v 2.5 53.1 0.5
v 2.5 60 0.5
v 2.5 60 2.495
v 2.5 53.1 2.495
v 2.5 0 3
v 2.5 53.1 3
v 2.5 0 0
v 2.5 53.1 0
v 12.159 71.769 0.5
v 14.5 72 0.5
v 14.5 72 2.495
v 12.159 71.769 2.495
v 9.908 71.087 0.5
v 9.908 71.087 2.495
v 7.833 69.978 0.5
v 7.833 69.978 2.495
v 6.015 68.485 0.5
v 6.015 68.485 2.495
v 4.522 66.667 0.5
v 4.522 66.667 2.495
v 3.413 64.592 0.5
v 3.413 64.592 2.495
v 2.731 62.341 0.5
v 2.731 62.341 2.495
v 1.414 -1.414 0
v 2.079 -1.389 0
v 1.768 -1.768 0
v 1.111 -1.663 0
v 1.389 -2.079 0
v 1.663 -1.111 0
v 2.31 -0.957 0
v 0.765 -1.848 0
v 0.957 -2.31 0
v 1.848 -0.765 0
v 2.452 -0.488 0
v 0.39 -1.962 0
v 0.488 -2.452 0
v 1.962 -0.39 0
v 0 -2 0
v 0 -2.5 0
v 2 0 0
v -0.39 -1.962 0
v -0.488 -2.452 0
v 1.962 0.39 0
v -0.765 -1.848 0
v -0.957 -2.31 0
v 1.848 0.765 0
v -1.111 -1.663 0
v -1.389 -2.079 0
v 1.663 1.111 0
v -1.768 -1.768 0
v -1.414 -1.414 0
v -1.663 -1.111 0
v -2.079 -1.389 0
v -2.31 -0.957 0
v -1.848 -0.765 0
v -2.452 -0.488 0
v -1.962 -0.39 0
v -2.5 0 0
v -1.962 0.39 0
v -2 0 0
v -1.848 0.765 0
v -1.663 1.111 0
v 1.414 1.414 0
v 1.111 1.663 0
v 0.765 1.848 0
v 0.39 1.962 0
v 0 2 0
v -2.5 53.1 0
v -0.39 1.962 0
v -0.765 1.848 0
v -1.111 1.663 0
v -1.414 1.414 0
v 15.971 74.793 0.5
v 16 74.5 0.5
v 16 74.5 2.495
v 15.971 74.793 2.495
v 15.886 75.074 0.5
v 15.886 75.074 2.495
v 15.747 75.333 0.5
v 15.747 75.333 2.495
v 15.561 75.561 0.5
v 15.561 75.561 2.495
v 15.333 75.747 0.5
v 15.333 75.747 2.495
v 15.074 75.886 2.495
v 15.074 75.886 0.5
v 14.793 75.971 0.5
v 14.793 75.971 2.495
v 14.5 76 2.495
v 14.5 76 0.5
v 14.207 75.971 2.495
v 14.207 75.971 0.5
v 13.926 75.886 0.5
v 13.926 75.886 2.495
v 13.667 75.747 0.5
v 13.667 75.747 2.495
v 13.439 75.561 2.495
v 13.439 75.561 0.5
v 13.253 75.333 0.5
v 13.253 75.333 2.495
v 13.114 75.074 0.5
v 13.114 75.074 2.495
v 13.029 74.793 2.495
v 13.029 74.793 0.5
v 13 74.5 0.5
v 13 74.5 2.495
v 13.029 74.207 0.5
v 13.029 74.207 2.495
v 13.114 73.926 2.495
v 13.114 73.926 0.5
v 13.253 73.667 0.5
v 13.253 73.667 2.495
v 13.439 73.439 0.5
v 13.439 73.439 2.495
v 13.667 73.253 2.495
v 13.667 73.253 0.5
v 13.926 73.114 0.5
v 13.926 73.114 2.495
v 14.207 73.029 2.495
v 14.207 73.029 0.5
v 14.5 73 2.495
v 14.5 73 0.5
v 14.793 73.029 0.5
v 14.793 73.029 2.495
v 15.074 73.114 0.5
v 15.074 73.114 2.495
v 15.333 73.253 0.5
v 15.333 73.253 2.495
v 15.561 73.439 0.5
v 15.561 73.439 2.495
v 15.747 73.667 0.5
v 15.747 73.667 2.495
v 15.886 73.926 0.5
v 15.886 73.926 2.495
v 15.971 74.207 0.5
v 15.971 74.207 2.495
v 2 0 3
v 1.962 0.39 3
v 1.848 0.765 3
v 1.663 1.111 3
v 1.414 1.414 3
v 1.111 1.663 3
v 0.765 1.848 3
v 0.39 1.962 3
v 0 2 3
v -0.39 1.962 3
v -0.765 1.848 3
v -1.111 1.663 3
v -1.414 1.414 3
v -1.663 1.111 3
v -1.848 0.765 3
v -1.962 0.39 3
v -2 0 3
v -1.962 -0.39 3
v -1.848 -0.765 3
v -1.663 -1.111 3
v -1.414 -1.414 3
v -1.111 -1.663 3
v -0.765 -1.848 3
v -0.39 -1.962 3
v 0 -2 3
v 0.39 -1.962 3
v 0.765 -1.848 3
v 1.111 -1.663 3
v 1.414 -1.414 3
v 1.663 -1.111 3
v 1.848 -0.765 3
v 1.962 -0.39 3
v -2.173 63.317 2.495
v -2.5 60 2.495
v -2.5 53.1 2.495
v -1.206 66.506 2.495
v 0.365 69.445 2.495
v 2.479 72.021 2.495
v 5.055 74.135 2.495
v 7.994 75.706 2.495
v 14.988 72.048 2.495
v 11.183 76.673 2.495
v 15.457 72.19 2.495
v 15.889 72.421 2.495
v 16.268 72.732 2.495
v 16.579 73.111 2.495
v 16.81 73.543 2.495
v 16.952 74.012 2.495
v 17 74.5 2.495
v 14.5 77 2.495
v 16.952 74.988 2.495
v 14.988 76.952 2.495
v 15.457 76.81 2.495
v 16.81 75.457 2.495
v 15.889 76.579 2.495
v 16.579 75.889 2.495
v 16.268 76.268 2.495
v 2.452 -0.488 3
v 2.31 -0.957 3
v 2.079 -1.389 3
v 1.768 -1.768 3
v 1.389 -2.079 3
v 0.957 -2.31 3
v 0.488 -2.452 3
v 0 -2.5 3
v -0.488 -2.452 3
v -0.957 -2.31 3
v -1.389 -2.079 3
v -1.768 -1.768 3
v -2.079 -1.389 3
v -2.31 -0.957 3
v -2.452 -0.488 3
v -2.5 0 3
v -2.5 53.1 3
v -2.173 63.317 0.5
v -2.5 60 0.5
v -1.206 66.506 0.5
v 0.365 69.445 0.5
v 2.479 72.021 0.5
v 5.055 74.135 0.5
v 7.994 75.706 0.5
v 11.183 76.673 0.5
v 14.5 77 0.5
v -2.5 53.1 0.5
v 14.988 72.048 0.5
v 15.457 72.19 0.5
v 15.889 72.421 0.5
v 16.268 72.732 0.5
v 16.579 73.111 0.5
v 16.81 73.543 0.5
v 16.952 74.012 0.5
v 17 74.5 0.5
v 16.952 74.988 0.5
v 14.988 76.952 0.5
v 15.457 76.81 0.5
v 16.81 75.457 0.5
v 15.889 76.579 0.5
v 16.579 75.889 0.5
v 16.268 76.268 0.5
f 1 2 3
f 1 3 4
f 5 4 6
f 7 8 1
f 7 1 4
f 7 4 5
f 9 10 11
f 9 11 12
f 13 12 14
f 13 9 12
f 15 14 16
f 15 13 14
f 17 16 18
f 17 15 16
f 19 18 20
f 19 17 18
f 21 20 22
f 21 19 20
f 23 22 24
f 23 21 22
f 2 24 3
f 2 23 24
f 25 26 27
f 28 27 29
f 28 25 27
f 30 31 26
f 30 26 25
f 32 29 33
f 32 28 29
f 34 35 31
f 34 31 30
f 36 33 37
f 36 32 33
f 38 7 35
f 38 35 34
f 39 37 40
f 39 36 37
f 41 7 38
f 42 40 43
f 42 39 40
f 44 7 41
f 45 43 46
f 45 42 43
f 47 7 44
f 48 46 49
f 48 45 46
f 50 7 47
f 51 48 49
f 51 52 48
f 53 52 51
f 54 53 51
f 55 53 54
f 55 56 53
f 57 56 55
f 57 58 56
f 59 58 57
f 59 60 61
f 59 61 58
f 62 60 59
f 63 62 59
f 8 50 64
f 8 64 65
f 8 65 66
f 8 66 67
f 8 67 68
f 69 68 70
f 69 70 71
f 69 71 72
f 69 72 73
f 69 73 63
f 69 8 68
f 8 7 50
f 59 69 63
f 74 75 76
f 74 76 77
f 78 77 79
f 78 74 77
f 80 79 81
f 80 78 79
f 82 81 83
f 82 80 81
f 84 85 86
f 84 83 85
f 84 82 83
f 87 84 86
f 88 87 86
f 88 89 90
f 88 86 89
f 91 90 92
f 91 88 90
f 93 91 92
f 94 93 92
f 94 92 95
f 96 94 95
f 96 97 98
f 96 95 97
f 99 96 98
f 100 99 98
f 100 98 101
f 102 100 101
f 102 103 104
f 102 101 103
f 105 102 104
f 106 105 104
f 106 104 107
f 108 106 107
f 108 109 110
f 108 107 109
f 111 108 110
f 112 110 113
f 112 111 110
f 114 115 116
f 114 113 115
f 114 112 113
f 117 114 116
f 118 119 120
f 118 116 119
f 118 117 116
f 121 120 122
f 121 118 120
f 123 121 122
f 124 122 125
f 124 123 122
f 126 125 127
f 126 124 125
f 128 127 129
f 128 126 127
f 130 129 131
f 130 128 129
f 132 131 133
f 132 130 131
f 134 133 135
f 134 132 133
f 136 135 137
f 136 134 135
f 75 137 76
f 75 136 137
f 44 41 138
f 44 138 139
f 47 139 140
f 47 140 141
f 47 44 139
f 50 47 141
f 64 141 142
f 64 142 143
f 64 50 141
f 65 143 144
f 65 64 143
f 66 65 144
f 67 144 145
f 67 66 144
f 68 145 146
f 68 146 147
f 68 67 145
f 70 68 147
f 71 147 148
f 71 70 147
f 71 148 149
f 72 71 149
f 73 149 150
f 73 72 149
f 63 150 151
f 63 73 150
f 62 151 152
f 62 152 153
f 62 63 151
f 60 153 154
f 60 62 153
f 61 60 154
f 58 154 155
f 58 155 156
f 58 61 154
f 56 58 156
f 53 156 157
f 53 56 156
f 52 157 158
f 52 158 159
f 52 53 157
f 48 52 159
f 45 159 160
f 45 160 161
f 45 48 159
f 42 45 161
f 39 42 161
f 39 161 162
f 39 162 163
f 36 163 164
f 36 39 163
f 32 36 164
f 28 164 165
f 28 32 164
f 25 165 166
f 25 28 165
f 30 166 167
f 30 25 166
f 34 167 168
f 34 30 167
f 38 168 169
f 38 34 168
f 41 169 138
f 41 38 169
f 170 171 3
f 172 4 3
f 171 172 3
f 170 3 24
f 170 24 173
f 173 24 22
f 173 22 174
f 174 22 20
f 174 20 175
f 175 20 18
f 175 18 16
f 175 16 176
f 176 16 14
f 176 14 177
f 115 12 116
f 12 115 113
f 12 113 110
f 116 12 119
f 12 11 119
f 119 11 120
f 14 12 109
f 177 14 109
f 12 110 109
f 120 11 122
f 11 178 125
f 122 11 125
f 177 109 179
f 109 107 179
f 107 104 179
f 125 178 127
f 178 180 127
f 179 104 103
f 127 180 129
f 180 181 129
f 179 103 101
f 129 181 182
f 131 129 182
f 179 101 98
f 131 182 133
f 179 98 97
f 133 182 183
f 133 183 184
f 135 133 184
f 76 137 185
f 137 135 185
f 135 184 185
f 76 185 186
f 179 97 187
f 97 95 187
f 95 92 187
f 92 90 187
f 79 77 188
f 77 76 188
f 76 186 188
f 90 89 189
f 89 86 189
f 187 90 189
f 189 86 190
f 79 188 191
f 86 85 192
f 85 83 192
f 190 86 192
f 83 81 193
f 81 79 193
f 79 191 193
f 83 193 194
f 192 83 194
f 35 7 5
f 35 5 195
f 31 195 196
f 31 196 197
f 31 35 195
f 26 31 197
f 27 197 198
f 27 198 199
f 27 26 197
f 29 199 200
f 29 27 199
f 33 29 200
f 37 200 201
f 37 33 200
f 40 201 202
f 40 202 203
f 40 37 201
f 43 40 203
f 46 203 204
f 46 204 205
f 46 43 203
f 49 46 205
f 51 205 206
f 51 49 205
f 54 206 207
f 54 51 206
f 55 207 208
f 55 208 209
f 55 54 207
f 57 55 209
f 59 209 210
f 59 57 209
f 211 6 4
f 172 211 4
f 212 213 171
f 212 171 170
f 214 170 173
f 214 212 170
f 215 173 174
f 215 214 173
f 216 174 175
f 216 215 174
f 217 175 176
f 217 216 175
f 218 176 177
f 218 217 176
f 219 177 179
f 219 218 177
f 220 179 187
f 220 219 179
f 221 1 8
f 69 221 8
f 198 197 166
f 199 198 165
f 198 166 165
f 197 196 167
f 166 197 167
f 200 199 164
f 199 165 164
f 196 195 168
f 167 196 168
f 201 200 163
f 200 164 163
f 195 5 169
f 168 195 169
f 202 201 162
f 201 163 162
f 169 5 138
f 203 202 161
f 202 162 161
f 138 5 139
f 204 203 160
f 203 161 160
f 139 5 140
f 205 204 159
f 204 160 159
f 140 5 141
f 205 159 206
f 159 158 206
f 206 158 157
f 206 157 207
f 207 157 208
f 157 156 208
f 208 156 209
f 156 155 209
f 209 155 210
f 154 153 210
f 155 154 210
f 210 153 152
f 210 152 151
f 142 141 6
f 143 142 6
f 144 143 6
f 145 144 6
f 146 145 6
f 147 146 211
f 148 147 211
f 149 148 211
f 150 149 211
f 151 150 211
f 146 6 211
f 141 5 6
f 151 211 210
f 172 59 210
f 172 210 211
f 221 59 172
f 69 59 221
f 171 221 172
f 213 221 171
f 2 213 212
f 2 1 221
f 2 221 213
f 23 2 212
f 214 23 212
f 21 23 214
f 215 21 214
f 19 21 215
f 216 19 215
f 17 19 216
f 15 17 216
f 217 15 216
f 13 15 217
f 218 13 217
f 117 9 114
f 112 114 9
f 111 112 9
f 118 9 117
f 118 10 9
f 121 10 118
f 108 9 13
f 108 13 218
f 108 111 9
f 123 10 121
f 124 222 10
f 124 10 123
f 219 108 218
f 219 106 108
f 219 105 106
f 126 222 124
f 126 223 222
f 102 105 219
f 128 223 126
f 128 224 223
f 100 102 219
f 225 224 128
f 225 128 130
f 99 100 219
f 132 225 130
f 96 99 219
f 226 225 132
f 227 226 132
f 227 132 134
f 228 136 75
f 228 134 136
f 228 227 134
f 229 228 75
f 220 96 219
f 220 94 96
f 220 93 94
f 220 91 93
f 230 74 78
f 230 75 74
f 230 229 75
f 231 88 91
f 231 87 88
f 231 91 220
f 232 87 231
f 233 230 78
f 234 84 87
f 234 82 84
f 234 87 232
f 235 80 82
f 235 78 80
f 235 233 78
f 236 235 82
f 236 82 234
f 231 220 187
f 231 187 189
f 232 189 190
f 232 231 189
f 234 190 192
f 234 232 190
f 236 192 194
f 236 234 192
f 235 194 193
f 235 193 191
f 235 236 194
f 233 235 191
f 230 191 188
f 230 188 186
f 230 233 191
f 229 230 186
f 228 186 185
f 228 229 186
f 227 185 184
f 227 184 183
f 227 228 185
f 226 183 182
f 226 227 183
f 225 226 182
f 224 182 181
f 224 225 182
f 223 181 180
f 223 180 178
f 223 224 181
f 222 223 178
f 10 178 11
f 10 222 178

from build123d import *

# Parameters (mm, degrees)
SKETCH_1_R               = 2
SKETCH_1_R_2             = 1.5
EXTRUDE_1_DEPTH          = 3
SKETCH_2_W               = 0.5
SKETCH_2_H               = 23.89994555
SKETCH_2_W_2             = 0.589580916
CUT_EXTRUDE_1_DEPTH      = 18
CUT_EXTRUDE_1_DEPTH_BACK = 3.5


with BuildPart() as part:
    # 草图1 → 凸台-拉伸1 (new body)
    with BuildSketch(Plane.XY):
        with BuildLine():
            Line((-2.5, 0), (-2.5, 60))
            ThreePointArc((-2.5, 60), (2.47918472, 72.02081528), (14.5, 77))
            ThreePointArc((14.5, 77), (17, 74.5), (14.5, 72))
            ThreePointArc((14.5, 72), (6.014718626, 68.485281374), (2.5, 60))
            Line((2.5, 60), (2.5, 0))
            ThreePointArc((2.5, 0), (0, -2.5), (-2.5, 0))
        make_face()
        Circle(SKETCH_1_R, mode=Mode.SUBTRACT)
        with Locations((14.5, 74.5)):
            Circle(SKETCH_1_R_2, mode=Mode.SUBTRACT)
    extrude(amount=EXTRUDE_1_DEPTH)

    # 草图2 → 切除-拉伸1 (cut, two sides)
    with BuildSketch(Plane(origin=(0, 0, 0), x_dir=(0, 0, -1), z_dir=(1, 0, 0))) as cut_extrude_1_sk:
        with Locations((-0.25, 65.050027225)):
            Rectangle(SKETCH_2_W, SKETCH_2_H)
        with Locations((-2.790044711, 65.050027225)):
            Rectangle(SKETCH_2_W_2, SKETCH_2_H)
    extrude(amount=CUT_EXTRUDE_1_DEPTH, mode=Mode.SUBTRACT)
    extrude(cut_extrude_1_sk.sketch, amount=-CUT_EXTRUDE_1_DEPTH_BACK, mode=Mode.SUBTRACT)


solid = part.part
